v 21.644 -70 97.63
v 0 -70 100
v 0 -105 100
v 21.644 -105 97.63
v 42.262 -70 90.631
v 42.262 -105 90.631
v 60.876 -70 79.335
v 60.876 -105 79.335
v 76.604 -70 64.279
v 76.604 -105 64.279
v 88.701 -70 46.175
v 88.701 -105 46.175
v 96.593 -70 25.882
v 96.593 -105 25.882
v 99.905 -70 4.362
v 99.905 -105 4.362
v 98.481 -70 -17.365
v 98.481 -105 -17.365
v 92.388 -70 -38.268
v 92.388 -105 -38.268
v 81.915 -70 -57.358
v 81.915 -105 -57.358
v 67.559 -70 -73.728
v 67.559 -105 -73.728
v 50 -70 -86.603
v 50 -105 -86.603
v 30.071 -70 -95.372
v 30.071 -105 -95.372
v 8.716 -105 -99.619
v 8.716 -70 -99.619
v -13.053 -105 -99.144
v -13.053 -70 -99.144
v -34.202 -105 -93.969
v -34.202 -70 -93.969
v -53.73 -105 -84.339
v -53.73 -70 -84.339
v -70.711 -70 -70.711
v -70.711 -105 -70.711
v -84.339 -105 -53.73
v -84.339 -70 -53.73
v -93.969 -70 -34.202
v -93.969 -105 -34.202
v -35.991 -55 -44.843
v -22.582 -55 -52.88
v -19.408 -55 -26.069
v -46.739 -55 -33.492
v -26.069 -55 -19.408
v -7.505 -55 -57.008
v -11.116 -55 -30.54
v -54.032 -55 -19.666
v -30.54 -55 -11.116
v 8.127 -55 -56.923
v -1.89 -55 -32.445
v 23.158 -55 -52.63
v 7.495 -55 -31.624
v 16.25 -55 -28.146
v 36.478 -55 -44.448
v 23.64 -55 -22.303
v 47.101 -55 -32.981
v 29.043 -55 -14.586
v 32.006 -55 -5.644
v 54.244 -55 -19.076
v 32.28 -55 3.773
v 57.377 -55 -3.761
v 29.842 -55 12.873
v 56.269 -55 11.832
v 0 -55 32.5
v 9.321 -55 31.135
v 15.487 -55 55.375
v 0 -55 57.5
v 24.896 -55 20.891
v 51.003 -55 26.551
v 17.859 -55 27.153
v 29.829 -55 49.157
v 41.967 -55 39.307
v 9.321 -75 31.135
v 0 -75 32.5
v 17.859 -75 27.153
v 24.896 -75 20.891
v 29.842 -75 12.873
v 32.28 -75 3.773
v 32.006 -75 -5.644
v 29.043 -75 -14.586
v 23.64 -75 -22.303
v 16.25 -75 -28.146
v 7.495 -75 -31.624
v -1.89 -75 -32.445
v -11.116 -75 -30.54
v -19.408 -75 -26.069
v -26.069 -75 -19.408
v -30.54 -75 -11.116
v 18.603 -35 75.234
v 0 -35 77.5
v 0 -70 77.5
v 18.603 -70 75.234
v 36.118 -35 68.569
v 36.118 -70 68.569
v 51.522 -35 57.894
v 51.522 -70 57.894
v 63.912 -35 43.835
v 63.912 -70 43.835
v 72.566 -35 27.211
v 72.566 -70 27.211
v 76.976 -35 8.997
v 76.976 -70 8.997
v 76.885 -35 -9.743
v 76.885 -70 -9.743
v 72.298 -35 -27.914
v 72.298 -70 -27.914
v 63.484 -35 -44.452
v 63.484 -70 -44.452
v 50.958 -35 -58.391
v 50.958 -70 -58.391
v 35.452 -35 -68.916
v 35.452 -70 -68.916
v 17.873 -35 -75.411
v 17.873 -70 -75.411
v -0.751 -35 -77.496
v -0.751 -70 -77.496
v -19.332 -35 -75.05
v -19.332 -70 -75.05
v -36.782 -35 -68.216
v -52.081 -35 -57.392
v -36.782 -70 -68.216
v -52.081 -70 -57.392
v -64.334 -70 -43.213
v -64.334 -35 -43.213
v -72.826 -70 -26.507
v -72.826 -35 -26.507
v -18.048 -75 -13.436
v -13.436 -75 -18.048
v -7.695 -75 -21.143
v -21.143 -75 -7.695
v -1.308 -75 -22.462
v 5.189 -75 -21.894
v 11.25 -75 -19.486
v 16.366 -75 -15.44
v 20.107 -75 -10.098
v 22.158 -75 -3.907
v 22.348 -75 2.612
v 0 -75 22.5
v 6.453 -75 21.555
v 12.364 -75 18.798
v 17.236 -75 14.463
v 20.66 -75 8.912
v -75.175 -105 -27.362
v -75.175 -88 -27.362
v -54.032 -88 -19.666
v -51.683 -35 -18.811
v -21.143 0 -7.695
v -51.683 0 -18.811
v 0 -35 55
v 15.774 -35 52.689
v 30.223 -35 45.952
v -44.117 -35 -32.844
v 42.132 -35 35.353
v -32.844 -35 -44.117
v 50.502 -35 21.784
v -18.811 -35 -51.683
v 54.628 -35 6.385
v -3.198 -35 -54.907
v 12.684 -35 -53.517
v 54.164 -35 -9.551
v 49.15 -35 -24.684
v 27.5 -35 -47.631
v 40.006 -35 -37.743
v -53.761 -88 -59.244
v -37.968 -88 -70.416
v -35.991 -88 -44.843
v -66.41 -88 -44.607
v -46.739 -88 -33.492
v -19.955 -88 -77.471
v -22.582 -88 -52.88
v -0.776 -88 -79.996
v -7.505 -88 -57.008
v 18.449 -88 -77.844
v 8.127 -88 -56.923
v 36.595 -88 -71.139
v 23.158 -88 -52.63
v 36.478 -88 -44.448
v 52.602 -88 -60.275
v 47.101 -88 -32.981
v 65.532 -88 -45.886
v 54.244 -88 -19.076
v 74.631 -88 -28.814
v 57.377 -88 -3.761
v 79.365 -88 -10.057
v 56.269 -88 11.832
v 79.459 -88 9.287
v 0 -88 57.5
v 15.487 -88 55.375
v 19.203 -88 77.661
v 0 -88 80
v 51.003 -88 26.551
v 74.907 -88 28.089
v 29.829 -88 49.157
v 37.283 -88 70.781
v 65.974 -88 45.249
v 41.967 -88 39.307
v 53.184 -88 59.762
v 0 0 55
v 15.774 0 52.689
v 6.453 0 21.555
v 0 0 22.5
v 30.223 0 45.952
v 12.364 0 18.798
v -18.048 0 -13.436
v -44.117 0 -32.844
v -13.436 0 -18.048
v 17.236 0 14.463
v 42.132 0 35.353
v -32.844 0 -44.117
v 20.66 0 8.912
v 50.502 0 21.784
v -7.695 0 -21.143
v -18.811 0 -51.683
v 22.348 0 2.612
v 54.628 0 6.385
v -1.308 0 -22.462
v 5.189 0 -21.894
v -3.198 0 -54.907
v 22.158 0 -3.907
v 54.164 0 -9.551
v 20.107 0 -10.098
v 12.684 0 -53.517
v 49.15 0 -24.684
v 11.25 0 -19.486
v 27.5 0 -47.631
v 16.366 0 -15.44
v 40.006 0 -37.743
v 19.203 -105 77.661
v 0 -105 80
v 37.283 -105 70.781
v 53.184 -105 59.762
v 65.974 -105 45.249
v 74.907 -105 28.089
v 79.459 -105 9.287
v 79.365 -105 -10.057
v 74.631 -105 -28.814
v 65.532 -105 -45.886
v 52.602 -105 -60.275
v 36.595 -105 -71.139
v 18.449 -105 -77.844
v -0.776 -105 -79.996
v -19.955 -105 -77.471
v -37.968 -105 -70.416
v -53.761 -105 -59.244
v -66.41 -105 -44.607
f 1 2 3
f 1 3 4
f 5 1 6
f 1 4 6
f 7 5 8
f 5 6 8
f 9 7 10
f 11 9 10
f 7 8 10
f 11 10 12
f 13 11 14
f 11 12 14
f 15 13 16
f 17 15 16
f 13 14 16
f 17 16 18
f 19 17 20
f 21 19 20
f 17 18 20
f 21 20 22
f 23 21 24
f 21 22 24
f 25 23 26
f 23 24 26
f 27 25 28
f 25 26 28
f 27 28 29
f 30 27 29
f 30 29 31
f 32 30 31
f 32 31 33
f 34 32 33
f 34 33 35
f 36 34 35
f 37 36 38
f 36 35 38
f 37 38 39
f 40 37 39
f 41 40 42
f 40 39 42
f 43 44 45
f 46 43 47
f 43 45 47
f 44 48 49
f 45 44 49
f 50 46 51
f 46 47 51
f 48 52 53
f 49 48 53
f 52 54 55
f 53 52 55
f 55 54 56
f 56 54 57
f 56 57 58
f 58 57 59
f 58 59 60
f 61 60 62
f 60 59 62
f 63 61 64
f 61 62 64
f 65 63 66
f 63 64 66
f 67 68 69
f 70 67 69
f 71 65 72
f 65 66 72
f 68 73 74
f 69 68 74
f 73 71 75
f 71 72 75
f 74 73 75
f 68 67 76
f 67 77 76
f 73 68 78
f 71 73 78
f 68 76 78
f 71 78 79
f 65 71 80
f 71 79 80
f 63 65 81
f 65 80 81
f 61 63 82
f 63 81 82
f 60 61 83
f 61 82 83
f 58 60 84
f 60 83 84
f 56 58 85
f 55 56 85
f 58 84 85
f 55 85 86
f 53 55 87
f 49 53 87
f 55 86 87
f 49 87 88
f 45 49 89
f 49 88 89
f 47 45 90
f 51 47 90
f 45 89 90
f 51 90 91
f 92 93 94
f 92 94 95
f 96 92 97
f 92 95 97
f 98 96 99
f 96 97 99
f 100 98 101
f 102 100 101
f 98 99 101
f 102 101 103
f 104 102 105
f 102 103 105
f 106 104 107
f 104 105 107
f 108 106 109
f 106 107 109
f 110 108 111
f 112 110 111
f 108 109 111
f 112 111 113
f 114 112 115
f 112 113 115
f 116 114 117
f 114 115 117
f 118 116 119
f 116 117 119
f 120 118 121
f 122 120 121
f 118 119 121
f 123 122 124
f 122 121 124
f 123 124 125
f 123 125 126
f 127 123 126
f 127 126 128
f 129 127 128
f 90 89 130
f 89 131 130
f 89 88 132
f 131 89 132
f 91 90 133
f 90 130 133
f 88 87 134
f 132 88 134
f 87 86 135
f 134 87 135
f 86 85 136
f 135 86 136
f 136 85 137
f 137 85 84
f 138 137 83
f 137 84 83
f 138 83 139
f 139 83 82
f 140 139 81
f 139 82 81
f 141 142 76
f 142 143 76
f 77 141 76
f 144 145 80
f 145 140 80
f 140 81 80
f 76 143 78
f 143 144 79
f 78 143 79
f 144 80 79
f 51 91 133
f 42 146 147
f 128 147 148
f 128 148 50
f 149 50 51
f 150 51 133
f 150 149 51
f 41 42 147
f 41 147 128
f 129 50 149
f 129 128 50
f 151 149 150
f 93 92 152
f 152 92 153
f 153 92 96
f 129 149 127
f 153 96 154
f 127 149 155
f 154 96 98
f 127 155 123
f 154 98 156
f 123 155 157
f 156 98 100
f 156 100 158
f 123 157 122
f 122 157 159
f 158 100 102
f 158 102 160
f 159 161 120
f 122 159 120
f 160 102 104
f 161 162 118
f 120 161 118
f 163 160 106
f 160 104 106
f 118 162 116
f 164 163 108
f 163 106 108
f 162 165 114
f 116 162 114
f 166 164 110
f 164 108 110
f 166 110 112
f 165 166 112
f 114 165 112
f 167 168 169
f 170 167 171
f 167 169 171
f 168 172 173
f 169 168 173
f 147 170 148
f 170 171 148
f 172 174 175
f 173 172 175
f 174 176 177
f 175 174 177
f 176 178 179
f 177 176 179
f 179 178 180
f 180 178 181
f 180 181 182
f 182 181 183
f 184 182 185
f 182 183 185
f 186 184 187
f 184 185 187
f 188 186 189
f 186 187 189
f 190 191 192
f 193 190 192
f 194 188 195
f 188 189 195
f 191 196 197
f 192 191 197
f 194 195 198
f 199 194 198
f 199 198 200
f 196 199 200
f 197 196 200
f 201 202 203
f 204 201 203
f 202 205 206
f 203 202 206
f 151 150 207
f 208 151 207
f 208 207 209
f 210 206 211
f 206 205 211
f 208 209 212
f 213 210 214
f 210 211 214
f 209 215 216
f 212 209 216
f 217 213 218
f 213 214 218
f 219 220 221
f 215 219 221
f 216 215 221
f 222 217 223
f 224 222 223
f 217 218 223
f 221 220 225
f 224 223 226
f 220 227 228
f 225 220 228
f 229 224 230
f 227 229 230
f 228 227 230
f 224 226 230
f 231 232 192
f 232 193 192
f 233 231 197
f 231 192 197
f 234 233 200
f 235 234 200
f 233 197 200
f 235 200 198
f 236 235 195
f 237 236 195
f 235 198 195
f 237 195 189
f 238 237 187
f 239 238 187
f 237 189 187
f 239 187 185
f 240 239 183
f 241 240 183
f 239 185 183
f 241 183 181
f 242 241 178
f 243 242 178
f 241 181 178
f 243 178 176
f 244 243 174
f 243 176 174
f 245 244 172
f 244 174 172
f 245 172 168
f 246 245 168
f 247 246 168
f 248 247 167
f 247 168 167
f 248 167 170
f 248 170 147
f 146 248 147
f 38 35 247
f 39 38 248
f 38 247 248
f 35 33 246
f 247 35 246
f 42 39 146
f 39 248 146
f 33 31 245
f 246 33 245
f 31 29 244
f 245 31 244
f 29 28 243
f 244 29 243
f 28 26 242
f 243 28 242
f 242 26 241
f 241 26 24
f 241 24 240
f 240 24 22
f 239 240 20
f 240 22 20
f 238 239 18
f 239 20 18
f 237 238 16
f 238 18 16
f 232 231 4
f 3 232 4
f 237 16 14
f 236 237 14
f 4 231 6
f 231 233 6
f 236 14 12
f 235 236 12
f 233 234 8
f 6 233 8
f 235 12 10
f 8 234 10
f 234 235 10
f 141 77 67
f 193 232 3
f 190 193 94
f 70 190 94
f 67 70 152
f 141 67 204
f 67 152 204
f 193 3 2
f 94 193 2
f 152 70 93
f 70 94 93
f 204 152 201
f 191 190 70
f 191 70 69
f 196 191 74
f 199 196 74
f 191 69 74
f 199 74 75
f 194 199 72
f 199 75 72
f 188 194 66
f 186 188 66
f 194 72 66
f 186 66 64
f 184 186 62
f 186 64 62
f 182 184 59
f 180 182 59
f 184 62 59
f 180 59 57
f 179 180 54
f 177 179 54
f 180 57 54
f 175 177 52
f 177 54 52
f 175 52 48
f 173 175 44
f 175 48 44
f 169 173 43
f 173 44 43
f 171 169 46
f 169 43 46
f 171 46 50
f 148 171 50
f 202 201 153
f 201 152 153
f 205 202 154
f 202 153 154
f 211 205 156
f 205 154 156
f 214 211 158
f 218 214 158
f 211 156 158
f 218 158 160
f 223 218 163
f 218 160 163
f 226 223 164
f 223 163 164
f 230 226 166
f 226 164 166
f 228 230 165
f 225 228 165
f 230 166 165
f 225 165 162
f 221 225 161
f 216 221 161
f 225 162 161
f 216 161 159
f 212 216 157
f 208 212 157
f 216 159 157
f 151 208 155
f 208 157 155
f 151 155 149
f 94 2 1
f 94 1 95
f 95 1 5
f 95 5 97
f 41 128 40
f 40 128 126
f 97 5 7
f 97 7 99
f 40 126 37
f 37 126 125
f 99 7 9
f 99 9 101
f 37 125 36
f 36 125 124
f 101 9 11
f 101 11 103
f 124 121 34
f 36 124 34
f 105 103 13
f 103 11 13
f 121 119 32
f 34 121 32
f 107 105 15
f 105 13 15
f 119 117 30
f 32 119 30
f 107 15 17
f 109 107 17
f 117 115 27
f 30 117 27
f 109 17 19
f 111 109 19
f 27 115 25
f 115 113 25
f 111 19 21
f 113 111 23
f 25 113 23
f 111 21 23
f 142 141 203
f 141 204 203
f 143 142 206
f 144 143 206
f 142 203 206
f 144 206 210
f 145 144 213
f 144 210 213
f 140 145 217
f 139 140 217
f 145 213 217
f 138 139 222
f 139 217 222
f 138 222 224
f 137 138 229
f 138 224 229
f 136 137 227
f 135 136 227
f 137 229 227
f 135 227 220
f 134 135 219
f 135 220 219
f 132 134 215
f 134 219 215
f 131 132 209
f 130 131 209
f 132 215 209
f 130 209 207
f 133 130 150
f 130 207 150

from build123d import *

# Parameters (mm, degrees)
REVOLUTION_ANGLE = 250


with BuildPart() as part:
    # Sketch → Revolution (revolve)
    with BuildSketch(Plane.YZ):
        Polygon((-75, 22.5), (0, 22.5), (0, 55), (-35, 55), (-35, 77.5), (-70, 77.5), (-70, 100), (-105, 100), (-105, 80), (-88, 80), (-88, 57.5), (-55, 57.5), (-55, 32.5), (-75, 32.5), align=None)
    revolve(axis=Axis((0, 0, 0), (0, 1, 0)), revolution_arc=REVOLUTION_ANGLE)


solid = part.part
